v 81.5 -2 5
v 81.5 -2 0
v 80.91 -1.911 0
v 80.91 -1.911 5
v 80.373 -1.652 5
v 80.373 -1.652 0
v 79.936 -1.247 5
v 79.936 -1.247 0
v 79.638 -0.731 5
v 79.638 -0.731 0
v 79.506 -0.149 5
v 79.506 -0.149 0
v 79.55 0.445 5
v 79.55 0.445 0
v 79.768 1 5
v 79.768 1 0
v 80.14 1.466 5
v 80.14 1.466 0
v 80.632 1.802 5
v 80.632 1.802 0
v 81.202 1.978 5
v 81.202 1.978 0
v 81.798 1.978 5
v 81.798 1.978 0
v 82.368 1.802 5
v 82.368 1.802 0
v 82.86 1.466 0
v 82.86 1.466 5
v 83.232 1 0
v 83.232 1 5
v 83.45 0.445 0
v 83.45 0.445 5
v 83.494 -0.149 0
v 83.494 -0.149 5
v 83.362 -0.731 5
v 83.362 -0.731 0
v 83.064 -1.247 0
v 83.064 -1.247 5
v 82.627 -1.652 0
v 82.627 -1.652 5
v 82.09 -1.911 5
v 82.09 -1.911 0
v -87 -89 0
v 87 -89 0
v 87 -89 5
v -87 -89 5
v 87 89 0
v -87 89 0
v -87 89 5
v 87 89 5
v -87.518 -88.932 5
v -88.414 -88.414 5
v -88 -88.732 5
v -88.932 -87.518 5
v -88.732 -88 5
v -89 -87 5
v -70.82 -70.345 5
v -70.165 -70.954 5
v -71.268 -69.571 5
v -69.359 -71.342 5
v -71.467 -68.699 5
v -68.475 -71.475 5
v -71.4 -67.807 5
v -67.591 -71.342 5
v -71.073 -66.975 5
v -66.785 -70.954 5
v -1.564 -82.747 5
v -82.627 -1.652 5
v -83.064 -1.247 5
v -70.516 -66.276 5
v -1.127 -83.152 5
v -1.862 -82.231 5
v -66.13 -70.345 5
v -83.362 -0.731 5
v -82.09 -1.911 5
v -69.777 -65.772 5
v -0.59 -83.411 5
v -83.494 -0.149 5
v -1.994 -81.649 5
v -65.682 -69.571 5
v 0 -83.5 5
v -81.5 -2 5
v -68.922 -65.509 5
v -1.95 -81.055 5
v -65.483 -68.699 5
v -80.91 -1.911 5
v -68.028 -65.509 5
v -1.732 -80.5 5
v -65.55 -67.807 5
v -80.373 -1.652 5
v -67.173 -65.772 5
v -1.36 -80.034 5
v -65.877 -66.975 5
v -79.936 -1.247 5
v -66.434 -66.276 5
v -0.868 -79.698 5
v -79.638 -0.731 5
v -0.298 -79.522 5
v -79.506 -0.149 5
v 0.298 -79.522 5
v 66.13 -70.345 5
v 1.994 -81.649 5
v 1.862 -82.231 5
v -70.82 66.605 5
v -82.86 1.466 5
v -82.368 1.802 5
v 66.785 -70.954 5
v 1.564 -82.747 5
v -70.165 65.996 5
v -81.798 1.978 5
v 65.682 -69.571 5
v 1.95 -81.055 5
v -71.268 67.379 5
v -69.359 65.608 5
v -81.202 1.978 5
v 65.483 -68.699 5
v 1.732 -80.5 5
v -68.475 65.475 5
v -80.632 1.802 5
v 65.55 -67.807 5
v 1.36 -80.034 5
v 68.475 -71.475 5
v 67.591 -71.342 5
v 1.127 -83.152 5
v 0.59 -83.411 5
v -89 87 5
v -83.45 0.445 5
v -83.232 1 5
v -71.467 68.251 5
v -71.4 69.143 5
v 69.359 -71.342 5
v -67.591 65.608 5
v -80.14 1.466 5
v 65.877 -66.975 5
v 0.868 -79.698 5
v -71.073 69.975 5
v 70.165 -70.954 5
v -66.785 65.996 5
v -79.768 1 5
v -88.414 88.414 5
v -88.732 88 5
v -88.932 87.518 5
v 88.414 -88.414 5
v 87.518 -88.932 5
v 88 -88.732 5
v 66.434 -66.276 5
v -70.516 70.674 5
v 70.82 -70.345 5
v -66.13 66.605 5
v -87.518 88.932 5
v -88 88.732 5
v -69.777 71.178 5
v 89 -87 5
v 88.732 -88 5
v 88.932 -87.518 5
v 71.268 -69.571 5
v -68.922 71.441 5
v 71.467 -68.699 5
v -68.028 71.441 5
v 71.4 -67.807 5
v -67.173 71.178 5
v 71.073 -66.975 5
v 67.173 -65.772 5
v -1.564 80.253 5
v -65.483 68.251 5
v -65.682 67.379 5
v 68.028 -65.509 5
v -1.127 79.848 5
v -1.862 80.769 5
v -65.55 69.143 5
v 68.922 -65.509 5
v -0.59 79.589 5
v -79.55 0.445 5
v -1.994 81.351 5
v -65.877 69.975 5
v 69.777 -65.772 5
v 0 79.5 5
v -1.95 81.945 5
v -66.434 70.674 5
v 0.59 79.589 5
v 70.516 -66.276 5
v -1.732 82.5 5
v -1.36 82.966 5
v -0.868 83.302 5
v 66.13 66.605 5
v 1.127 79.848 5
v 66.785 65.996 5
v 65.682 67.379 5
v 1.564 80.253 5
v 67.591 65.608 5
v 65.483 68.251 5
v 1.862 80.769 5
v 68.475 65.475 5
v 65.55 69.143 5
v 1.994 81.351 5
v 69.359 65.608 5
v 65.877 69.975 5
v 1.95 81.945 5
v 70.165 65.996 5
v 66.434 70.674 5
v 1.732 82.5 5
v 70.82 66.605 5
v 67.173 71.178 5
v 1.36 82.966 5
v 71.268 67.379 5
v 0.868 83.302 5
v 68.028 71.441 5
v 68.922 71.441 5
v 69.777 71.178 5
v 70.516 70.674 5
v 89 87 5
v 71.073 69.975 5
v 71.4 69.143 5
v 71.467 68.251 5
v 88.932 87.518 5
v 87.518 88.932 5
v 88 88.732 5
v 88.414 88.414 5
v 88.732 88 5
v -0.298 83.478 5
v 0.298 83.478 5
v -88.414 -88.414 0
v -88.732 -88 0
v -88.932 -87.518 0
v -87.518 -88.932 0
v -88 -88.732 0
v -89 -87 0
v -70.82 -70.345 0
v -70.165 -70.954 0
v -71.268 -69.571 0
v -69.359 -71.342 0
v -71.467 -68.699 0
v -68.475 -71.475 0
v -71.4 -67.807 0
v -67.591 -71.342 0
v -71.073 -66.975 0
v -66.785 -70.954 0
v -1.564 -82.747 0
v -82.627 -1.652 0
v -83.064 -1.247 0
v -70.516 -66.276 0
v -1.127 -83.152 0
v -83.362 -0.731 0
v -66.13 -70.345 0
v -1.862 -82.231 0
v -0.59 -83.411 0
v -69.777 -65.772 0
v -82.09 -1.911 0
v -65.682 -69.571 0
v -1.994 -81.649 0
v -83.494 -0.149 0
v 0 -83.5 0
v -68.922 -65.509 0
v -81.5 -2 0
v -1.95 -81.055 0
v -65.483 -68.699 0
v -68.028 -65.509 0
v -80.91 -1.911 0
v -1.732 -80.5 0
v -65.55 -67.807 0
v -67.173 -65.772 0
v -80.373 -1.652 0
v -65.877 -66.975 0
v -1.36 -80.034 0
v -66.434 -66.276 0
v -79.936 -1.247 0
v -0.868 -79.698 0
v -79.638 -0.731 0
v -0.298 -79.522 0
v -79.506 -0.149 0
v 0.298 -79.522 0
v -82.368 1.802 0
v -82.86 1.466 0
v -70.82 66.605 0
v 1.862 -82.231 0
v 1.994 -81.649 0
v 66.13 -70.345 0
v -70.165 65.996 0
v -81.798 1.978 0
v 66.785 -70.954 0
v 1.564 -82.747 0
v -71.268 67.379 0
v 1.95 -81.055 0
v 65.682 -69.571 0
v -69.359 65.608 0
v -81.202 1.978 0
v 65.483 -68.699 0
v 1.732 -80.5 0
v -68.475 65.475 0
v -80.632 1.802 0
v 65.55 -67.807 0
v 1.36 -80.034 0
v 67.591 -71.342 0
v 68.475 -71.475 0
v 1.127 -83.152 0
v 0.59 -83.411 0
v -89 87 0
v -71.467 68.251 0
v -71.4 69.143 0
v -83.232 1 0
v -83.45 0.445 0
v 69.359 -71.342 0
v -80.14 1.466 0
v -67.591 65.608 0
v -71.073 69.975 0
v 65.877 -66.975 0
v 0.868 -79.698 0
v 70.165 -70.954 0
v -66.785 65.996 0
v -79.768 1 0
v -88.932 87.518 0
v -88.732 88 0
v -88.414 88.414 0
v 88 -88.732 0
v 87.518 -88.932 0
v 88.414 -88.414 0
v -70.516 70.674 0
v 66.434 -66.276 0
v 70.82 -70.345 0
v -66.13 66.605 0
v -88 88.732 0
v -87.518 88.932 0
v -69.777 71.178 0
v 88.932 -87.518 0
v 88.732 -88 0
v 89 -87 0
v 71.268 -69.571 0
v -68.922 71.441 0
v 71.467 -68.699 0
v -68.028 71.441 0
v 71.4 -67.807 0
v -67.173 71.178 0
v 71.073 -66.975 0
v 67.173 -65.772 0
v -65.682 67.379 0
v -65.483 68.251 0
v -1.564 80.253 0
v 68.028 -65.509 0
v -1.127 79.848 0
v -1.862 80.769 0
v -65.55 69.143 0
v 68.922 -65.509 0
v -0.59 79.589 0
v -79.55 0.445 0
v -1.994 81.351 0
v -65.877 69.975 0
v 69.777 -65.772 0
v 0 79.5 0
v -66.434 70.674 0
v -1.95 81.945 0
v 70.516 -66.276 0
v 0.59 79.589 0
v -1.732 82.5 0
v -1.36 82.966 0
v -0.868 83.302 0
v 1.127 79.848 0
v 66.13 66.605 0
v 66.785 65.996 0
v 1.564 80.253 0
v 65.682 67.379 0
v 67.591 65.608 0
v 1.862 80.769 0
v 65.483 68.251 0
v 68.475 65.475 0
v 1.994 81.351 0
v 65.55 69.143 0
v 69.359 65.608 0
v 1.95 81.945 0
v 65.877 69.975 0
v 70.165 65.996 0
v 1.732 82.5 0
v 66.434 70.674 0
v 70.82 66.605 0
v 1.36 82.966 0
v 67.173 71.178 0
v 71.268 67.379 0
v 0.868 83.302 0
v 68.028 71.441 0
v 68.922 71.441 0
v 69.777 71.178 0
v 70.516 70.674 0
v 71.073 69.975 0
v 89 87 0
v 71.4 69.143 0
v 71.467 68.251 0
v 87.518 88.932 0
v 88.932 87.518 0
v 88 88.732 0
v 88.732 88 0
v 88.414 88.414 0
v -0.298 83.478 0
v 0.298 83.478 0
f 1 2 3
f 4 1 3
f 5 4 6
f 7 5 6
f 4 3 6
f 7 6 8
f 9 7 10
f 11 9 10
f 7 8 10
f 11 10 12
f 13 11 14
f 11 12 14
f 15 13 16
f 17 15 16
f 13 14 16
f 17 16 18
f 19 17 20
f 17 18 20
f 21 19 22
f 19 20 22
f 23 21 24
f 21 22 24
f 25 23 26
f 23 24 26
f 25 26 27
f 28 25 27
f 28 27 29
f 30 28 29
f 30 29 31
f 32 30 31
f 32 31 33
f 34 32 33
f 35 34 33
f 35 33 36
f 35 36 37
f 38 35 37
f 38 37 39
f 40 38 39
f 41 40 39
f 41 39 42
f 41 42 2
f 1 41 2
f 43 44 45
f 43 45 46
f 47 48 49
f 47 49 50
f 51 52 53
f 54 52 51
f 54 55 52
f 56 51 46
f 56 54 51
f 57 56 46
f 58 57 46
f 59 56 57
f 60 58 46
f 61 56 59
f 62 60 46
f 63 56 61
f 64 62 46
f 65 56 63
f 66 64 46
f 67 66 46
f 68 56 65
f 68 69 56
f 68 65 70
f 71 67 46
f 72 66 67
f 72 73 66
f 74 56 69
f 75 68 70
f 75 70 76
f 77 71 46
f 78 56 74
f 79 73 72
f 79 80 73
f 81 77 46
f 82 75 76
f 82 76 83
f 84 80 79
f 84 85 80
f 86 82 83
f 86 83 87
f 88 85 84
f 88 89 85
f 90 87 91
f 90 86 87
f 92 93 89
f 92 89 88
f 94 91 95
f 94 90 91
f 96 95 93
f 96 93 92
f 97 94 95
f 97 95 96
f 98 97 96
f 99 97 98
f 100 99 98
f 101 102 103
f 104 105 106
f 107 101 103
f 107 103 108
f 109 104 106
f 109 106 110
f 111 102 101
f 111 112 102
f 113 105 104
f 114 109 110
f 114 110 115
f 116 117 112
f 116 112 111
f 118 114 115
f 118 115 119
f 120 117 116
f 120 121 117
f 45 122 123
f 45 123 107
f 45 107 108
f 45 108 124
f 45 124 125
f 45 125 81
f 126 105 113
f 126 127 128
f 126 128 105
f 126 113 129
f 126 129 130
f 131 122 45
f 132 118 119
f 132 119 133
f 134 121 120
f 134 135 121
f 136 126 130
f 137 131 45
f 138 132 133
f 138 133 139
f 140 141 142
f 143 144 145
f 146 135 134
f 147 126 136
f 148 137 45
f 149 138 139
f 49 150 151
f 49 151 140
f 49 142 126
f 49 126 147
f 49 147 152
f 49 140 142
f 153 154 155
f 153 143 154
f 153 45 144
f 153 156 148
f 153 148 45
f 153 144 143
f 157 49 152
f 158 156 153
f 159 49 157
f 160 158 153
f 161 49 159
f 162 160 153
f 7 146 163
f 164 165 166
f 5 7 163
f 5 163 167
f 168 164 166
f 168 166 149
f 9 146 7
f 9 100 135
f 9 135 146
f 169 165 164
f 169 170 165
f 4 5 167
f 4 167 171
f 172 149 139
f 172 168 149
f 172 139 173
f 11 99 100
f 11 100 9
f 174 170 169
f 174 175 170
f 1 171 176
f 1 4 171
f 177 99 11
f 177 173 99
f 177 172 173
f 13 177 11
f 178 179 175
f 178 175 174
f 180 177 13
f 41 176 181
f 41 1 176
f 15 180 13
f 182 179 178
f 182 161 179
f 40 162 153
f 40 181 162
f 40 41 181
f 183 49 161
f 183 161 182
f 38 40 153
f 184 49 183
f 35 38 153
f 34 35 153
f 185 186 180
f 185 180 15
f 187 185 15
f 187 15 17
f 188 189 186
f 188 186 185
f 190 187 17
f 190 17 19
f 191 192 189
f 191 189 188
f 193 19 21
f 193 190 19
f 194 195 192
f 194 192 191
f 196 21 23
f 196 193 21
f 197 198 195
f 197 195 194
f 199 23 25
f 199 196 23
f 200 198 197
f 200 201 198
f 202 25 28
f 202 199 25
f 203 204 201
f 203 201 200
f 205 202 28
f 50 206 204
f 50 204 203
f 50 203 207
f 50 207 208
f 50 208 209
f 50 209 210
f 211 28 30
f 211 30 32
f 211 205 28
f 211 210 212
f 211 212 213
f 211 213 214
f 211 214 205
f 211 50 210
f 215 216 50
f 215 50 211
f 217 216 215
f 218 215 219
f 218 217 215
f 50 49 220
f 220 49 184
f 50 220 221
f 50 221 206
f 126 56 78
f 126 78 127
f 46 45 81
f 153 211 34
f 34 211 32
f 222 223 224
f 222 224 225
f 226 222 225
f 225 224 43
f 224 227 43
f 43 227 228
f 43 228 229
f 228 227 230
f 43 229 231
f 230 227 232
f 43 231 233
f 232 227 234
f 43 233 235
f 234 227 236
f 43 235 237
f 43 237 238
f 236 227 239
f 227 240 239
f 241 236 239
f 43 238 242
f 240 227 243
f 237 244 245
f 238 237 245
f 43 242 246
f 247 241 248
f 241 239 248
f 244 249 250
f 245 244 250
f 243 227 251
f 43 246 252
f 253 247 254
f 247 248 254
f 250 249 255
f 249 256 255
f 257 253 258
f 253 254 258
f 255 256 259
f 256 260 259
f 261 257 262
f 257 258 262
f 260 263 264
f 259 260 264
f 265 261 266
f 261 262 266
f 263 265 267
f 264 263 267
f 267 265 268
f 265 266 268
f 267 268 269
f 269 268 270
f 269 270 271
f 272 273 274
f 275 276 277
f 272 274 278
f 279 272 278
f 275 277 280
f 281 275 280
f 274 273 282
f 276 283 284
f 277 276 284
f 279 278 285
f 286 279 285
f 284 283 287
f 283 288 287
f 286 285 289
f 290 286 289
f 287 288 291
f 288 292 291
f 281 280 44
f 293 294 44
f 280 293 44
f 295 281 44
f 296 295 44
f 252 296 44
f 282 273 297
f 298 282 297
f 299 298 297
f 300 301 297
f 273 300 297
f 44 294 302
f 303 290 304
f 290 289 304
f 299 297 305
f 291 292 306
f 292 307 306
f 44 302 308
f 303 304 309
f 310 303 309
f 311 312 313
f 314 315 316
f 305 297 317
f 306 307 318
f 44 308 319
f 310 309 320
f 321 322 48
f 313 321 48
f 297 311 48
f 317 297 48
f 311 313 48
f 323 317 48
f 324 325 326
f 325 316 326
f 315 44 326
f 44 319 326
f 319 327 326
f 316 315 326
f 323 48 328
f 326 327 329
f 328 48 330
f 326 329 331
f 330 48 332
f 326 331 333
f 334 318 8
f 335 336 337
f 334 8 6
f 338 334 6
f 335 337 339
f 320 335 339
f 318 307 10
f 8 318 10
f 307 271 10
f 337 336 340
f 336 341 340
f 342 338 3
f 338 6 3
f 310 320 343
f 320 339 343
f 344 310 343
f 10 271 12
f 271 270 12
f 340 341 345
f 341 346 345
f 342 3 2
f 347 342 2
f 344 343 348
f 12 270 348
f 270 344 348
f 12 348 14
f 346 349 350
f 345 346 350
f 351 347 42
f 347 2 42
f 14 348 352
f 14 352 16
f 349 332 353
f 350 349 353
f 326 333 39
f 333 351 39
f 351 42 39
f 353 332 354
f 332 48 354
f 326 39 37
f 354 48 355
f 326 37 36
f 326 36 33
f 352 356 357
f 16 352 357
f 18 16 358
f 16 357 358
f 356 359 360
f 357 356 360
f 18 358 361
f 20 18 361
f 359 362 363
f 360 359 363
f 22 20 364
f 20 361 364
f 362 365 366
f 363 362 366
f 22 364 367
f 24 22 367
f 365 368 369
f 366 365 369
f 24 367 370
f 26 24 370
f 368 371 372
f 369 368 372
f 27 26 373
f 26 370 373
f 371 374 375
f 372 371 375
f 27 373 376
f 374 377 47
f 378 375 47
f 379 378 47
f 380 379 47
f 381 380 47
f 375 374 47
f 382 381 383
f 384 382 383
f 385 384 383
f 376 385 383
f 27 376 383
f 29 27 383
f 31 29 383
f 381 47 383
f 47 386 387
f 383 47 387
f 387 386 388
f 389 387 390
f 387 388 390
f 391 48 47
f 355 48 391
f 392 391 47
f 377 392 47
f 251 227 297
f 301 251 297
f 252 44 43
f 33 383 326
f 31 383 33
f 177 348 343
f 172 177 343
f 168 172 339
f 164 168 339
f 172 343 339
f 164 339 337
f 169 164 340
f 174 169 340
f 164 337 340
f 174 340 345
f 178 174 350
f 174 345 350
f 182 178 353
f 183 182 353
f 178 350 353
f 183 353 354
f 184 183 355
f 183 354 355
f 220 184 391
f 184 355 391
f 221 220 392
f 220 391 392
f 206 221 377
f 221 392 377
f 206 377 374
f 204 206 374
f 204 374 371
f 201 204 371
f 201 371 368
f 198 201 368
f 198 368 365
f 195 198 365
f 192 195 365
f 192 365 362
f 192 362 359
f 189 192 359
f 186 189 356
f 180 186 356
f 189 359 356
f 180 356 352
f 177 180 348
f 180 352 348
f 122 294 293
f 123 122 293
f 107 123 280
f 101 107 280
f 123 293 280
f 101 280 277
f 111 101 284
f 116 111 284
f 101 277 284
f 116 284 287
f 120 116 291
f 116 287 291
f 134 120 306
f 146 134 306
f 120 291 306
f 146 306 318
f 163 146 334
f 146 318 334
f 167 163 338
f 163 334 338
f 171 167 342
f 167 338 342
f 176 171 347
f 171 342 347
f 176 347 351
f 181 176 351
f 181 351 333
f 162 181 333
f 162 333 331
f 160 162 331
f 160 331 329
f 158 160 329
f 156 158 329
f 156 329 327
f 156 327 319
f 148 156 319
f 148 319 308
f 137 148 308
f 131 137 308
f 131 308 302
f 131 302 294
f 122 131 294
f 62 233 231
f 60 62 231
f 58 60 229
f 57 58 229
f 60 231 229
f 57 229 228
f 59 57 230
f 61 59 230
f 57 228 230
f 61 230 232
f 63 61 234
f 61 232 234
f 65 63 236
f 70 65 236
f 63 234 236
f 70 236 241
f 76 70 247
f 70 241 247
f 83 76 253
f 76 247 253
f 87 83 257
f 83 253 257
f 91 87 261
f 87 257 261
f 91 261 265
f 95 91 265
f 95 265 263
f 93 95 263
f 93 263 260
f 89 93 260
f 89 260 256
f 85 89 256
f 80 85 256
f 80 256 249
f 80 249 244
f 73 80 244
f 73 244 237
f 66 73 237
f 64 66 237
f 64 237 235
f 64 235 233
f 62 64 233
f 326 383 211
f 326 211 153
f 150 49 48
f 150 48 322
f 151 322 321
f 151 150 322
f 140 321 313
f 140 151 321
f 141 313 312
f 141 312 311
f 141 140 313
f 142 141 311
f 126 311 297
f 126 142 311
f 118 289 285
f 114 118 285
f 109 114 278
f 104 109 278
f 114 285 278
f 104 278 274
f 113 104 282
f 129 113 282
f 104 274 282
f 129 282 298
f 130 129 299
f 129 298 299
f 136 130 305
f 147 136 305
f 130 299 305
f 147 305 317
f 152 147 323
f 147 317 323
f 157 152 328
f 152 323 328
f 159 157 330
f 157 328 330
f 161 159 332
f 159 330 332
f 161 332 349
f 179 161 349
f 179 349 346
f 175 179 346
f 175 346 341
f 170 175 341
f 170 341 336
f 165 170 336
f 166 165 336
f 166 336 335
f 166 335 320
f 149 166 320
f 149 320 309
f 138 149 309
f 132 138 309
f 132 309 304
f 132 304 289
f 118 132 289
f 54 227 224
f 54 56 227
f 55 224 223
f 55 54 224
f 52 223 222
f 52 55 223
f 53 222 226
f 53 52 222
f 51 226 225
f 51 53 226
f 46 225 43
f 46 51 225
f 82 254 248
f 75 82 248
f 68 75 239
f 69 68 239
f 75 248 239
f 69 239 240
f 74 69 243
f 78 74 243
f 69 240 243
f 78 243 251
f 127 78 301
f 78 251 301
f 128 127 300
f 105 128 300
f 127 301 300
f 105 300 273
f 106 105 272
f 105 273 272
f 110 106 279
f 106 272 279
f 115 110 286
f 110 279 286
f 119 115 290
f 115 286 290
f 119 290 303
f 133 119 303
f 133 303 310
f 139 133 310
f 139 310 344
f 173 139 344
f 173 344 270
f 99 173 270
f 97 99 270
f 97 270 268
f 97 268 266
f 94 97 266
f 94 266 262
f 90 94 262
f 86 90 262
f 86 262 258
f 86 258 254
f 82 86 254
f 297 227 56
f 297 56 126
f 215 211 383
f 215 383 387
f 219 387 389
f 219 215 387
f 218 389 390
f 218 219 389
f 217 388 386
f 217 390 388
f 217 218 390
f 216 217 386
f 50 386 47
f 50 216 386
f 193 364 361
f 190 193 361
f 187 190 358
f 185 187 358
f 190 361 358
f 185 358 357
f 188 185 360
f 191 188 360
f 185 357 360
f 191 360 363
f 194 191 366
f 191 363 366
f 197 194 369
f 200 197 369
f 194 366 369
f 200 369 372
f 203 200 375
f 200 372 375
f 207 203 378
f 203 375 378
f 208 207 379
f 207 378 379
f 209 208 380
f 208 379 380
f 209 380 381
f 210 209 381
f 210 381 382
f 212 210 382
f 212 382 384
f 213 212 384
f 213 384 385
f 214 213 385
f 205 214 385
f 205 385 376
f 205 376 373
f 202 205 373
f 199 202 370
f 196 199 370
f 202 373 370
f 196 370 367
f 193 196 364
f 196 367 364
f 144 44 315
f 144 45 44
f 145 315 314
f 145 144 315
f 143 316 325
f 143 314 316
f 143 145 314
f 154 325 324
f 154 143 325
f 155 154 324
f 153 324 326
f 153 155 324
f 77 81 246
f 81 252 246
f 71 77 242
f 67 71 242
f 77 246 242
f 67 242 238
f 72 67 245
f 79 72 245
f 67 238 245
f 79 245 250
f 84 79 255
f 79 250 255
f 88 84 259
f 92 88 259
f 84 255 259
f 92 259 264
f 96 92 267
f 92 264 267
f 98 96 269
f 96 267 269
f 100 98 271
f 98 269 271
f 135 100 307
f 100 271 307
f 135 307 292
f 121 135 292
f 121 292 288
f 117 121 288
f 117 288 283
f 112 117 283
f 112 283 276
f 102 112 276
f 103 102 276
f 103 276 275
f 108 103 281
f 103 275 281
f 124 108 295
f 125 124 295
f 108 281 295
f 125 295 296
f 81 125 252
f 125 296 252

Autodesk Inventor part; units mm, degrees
ref_plane "YZ Plane" through (0, 0, 0) normal (1, 0, 0) x (0, 1, 0)
ref_plane "XZ Plane" through (0, 0, 0) normal (0, 1, 0) x (-1, 0, 0)
ref_plane "XY Plane" through (0, 0, 0) normal (0, 0, 1) x (1, 0, 0)
sketch "Sketch1" plane through (0, 0, 0) normal (0, 0, 1) x (1, 0, 0)
  line L0 (-89, 89) -> (89, 89)
  line L1 (89, 89) -> (89, -89)
  line L2 (89, -89) -> (-89, -89)
  line L3 (-89, -89) -> (-89, 89)
  point P0 (0, 0)
  dimension "d33" = 178
  dimension "d34" = 89
  dimension "d35" = 89
extrude "Extrusion1" add sketch "Sketch1" along normal blind 5
sketch "Sketch2" plane through (0, 0, 5) normal (0, 0, 1) x (1, 0, 0)
  circle A0 centre (-81.5, 0) radius 2
  circle A1 centre (81.5, 0) radius 2
  line L0 (-78.5, 36.125) -> (-78.5, 56.125) projected
  line L1 (78.5, 56.125) -> (78.5, 36.125) projected
  circle A2 centre (0, 81.5) radius 2
  circle A3 centre (0, -81.5) radius 2
  line L2 (36.125, 78.5) -> (56.125, 78.5) projected
  line L3 (56.125, -78.5) -> (36.125, -78.5) projected
  line L4 (-89, 89) -> (-89, -89) projected
  line L5 (89, 89) -> (-89, 89) projected
  line L6 (89, -89) -> (89, 89) projected
  line L7 (-89, -89) -> (89, -89) projected
  point P0 (0, 0)
  point P1 (-78.5, -56.125)
  point P2 (78.5, -56.125)
  point P3 (-56.125, 78.5)
  point P4 (-56.125, -78.5)
  dimension "d18" = 4
  dimension "d37" = 7.5
  dimension "d38" = 7.5
  dimension "d39" = 7.5
  dimension "d40" = 7.5
hole "Hole1" at (-81.5, 0, 5) at (0, 81.5, 5) at (81.5, 0, 5) at (0, -81.5, 5) direction (0, 0, -1) diameter 4 end through all
fillet "Fillet1" radius 2 4 edges at (-89, -89, 2.5) (-89, 89, 2.5) (89, -89, 2.5) (89, 89, 2.5)
sketch "Sketch3" plane through (0, 0, 5) normal (0, 0, 1) x (1, 0, 0)
  line L0 (68.475, -68.475) -> (-68.475, -68.475)
  line L1 (-68.475, -68.475) -> (-68.475, 68.475)
  line L2 (-68.475, 68.475) -> (68.475, 68.475)
  line L3 (68.475, 68.475) -> (68.475, -68.475)
  line L4 (68.475, -68.475) -> (-68.475, 68.475) construction
  line L5 (-68.475, -68.475) -> (68.475, 68.475) construction
  circle A0 centre (-68.475, 68.475) radius 4.875
  point P0 (0, 0)
  dimension "d31" = 136.95
  dimension "d32" = 9.75
hole "Hole2" at (-68.475, 68.475, 5) at (68.475, 68.475, 5) at (68.475, -68.475, 5) at (-68.475, -68.475, 5) direction (0, 0, -1) diameter 6 end through all
equation "\"d34\" = 0.5 * d33"
equation "\"d35\" = 0.5 * d33"
equation "\"d38\" = d37"
equation "\"d39\" = d37"
equation "\"d40\" = d37"
equation "\"d21\" = d18"
equation "\"d6\" = 0.5 * d3"
equation "\"d7\" = 0.5 * d2"
equation "\"d3\" = 157"
equation "\"d2\" = 157"
properties part number "WaagePlexiOben2" material "PET Plastic"
